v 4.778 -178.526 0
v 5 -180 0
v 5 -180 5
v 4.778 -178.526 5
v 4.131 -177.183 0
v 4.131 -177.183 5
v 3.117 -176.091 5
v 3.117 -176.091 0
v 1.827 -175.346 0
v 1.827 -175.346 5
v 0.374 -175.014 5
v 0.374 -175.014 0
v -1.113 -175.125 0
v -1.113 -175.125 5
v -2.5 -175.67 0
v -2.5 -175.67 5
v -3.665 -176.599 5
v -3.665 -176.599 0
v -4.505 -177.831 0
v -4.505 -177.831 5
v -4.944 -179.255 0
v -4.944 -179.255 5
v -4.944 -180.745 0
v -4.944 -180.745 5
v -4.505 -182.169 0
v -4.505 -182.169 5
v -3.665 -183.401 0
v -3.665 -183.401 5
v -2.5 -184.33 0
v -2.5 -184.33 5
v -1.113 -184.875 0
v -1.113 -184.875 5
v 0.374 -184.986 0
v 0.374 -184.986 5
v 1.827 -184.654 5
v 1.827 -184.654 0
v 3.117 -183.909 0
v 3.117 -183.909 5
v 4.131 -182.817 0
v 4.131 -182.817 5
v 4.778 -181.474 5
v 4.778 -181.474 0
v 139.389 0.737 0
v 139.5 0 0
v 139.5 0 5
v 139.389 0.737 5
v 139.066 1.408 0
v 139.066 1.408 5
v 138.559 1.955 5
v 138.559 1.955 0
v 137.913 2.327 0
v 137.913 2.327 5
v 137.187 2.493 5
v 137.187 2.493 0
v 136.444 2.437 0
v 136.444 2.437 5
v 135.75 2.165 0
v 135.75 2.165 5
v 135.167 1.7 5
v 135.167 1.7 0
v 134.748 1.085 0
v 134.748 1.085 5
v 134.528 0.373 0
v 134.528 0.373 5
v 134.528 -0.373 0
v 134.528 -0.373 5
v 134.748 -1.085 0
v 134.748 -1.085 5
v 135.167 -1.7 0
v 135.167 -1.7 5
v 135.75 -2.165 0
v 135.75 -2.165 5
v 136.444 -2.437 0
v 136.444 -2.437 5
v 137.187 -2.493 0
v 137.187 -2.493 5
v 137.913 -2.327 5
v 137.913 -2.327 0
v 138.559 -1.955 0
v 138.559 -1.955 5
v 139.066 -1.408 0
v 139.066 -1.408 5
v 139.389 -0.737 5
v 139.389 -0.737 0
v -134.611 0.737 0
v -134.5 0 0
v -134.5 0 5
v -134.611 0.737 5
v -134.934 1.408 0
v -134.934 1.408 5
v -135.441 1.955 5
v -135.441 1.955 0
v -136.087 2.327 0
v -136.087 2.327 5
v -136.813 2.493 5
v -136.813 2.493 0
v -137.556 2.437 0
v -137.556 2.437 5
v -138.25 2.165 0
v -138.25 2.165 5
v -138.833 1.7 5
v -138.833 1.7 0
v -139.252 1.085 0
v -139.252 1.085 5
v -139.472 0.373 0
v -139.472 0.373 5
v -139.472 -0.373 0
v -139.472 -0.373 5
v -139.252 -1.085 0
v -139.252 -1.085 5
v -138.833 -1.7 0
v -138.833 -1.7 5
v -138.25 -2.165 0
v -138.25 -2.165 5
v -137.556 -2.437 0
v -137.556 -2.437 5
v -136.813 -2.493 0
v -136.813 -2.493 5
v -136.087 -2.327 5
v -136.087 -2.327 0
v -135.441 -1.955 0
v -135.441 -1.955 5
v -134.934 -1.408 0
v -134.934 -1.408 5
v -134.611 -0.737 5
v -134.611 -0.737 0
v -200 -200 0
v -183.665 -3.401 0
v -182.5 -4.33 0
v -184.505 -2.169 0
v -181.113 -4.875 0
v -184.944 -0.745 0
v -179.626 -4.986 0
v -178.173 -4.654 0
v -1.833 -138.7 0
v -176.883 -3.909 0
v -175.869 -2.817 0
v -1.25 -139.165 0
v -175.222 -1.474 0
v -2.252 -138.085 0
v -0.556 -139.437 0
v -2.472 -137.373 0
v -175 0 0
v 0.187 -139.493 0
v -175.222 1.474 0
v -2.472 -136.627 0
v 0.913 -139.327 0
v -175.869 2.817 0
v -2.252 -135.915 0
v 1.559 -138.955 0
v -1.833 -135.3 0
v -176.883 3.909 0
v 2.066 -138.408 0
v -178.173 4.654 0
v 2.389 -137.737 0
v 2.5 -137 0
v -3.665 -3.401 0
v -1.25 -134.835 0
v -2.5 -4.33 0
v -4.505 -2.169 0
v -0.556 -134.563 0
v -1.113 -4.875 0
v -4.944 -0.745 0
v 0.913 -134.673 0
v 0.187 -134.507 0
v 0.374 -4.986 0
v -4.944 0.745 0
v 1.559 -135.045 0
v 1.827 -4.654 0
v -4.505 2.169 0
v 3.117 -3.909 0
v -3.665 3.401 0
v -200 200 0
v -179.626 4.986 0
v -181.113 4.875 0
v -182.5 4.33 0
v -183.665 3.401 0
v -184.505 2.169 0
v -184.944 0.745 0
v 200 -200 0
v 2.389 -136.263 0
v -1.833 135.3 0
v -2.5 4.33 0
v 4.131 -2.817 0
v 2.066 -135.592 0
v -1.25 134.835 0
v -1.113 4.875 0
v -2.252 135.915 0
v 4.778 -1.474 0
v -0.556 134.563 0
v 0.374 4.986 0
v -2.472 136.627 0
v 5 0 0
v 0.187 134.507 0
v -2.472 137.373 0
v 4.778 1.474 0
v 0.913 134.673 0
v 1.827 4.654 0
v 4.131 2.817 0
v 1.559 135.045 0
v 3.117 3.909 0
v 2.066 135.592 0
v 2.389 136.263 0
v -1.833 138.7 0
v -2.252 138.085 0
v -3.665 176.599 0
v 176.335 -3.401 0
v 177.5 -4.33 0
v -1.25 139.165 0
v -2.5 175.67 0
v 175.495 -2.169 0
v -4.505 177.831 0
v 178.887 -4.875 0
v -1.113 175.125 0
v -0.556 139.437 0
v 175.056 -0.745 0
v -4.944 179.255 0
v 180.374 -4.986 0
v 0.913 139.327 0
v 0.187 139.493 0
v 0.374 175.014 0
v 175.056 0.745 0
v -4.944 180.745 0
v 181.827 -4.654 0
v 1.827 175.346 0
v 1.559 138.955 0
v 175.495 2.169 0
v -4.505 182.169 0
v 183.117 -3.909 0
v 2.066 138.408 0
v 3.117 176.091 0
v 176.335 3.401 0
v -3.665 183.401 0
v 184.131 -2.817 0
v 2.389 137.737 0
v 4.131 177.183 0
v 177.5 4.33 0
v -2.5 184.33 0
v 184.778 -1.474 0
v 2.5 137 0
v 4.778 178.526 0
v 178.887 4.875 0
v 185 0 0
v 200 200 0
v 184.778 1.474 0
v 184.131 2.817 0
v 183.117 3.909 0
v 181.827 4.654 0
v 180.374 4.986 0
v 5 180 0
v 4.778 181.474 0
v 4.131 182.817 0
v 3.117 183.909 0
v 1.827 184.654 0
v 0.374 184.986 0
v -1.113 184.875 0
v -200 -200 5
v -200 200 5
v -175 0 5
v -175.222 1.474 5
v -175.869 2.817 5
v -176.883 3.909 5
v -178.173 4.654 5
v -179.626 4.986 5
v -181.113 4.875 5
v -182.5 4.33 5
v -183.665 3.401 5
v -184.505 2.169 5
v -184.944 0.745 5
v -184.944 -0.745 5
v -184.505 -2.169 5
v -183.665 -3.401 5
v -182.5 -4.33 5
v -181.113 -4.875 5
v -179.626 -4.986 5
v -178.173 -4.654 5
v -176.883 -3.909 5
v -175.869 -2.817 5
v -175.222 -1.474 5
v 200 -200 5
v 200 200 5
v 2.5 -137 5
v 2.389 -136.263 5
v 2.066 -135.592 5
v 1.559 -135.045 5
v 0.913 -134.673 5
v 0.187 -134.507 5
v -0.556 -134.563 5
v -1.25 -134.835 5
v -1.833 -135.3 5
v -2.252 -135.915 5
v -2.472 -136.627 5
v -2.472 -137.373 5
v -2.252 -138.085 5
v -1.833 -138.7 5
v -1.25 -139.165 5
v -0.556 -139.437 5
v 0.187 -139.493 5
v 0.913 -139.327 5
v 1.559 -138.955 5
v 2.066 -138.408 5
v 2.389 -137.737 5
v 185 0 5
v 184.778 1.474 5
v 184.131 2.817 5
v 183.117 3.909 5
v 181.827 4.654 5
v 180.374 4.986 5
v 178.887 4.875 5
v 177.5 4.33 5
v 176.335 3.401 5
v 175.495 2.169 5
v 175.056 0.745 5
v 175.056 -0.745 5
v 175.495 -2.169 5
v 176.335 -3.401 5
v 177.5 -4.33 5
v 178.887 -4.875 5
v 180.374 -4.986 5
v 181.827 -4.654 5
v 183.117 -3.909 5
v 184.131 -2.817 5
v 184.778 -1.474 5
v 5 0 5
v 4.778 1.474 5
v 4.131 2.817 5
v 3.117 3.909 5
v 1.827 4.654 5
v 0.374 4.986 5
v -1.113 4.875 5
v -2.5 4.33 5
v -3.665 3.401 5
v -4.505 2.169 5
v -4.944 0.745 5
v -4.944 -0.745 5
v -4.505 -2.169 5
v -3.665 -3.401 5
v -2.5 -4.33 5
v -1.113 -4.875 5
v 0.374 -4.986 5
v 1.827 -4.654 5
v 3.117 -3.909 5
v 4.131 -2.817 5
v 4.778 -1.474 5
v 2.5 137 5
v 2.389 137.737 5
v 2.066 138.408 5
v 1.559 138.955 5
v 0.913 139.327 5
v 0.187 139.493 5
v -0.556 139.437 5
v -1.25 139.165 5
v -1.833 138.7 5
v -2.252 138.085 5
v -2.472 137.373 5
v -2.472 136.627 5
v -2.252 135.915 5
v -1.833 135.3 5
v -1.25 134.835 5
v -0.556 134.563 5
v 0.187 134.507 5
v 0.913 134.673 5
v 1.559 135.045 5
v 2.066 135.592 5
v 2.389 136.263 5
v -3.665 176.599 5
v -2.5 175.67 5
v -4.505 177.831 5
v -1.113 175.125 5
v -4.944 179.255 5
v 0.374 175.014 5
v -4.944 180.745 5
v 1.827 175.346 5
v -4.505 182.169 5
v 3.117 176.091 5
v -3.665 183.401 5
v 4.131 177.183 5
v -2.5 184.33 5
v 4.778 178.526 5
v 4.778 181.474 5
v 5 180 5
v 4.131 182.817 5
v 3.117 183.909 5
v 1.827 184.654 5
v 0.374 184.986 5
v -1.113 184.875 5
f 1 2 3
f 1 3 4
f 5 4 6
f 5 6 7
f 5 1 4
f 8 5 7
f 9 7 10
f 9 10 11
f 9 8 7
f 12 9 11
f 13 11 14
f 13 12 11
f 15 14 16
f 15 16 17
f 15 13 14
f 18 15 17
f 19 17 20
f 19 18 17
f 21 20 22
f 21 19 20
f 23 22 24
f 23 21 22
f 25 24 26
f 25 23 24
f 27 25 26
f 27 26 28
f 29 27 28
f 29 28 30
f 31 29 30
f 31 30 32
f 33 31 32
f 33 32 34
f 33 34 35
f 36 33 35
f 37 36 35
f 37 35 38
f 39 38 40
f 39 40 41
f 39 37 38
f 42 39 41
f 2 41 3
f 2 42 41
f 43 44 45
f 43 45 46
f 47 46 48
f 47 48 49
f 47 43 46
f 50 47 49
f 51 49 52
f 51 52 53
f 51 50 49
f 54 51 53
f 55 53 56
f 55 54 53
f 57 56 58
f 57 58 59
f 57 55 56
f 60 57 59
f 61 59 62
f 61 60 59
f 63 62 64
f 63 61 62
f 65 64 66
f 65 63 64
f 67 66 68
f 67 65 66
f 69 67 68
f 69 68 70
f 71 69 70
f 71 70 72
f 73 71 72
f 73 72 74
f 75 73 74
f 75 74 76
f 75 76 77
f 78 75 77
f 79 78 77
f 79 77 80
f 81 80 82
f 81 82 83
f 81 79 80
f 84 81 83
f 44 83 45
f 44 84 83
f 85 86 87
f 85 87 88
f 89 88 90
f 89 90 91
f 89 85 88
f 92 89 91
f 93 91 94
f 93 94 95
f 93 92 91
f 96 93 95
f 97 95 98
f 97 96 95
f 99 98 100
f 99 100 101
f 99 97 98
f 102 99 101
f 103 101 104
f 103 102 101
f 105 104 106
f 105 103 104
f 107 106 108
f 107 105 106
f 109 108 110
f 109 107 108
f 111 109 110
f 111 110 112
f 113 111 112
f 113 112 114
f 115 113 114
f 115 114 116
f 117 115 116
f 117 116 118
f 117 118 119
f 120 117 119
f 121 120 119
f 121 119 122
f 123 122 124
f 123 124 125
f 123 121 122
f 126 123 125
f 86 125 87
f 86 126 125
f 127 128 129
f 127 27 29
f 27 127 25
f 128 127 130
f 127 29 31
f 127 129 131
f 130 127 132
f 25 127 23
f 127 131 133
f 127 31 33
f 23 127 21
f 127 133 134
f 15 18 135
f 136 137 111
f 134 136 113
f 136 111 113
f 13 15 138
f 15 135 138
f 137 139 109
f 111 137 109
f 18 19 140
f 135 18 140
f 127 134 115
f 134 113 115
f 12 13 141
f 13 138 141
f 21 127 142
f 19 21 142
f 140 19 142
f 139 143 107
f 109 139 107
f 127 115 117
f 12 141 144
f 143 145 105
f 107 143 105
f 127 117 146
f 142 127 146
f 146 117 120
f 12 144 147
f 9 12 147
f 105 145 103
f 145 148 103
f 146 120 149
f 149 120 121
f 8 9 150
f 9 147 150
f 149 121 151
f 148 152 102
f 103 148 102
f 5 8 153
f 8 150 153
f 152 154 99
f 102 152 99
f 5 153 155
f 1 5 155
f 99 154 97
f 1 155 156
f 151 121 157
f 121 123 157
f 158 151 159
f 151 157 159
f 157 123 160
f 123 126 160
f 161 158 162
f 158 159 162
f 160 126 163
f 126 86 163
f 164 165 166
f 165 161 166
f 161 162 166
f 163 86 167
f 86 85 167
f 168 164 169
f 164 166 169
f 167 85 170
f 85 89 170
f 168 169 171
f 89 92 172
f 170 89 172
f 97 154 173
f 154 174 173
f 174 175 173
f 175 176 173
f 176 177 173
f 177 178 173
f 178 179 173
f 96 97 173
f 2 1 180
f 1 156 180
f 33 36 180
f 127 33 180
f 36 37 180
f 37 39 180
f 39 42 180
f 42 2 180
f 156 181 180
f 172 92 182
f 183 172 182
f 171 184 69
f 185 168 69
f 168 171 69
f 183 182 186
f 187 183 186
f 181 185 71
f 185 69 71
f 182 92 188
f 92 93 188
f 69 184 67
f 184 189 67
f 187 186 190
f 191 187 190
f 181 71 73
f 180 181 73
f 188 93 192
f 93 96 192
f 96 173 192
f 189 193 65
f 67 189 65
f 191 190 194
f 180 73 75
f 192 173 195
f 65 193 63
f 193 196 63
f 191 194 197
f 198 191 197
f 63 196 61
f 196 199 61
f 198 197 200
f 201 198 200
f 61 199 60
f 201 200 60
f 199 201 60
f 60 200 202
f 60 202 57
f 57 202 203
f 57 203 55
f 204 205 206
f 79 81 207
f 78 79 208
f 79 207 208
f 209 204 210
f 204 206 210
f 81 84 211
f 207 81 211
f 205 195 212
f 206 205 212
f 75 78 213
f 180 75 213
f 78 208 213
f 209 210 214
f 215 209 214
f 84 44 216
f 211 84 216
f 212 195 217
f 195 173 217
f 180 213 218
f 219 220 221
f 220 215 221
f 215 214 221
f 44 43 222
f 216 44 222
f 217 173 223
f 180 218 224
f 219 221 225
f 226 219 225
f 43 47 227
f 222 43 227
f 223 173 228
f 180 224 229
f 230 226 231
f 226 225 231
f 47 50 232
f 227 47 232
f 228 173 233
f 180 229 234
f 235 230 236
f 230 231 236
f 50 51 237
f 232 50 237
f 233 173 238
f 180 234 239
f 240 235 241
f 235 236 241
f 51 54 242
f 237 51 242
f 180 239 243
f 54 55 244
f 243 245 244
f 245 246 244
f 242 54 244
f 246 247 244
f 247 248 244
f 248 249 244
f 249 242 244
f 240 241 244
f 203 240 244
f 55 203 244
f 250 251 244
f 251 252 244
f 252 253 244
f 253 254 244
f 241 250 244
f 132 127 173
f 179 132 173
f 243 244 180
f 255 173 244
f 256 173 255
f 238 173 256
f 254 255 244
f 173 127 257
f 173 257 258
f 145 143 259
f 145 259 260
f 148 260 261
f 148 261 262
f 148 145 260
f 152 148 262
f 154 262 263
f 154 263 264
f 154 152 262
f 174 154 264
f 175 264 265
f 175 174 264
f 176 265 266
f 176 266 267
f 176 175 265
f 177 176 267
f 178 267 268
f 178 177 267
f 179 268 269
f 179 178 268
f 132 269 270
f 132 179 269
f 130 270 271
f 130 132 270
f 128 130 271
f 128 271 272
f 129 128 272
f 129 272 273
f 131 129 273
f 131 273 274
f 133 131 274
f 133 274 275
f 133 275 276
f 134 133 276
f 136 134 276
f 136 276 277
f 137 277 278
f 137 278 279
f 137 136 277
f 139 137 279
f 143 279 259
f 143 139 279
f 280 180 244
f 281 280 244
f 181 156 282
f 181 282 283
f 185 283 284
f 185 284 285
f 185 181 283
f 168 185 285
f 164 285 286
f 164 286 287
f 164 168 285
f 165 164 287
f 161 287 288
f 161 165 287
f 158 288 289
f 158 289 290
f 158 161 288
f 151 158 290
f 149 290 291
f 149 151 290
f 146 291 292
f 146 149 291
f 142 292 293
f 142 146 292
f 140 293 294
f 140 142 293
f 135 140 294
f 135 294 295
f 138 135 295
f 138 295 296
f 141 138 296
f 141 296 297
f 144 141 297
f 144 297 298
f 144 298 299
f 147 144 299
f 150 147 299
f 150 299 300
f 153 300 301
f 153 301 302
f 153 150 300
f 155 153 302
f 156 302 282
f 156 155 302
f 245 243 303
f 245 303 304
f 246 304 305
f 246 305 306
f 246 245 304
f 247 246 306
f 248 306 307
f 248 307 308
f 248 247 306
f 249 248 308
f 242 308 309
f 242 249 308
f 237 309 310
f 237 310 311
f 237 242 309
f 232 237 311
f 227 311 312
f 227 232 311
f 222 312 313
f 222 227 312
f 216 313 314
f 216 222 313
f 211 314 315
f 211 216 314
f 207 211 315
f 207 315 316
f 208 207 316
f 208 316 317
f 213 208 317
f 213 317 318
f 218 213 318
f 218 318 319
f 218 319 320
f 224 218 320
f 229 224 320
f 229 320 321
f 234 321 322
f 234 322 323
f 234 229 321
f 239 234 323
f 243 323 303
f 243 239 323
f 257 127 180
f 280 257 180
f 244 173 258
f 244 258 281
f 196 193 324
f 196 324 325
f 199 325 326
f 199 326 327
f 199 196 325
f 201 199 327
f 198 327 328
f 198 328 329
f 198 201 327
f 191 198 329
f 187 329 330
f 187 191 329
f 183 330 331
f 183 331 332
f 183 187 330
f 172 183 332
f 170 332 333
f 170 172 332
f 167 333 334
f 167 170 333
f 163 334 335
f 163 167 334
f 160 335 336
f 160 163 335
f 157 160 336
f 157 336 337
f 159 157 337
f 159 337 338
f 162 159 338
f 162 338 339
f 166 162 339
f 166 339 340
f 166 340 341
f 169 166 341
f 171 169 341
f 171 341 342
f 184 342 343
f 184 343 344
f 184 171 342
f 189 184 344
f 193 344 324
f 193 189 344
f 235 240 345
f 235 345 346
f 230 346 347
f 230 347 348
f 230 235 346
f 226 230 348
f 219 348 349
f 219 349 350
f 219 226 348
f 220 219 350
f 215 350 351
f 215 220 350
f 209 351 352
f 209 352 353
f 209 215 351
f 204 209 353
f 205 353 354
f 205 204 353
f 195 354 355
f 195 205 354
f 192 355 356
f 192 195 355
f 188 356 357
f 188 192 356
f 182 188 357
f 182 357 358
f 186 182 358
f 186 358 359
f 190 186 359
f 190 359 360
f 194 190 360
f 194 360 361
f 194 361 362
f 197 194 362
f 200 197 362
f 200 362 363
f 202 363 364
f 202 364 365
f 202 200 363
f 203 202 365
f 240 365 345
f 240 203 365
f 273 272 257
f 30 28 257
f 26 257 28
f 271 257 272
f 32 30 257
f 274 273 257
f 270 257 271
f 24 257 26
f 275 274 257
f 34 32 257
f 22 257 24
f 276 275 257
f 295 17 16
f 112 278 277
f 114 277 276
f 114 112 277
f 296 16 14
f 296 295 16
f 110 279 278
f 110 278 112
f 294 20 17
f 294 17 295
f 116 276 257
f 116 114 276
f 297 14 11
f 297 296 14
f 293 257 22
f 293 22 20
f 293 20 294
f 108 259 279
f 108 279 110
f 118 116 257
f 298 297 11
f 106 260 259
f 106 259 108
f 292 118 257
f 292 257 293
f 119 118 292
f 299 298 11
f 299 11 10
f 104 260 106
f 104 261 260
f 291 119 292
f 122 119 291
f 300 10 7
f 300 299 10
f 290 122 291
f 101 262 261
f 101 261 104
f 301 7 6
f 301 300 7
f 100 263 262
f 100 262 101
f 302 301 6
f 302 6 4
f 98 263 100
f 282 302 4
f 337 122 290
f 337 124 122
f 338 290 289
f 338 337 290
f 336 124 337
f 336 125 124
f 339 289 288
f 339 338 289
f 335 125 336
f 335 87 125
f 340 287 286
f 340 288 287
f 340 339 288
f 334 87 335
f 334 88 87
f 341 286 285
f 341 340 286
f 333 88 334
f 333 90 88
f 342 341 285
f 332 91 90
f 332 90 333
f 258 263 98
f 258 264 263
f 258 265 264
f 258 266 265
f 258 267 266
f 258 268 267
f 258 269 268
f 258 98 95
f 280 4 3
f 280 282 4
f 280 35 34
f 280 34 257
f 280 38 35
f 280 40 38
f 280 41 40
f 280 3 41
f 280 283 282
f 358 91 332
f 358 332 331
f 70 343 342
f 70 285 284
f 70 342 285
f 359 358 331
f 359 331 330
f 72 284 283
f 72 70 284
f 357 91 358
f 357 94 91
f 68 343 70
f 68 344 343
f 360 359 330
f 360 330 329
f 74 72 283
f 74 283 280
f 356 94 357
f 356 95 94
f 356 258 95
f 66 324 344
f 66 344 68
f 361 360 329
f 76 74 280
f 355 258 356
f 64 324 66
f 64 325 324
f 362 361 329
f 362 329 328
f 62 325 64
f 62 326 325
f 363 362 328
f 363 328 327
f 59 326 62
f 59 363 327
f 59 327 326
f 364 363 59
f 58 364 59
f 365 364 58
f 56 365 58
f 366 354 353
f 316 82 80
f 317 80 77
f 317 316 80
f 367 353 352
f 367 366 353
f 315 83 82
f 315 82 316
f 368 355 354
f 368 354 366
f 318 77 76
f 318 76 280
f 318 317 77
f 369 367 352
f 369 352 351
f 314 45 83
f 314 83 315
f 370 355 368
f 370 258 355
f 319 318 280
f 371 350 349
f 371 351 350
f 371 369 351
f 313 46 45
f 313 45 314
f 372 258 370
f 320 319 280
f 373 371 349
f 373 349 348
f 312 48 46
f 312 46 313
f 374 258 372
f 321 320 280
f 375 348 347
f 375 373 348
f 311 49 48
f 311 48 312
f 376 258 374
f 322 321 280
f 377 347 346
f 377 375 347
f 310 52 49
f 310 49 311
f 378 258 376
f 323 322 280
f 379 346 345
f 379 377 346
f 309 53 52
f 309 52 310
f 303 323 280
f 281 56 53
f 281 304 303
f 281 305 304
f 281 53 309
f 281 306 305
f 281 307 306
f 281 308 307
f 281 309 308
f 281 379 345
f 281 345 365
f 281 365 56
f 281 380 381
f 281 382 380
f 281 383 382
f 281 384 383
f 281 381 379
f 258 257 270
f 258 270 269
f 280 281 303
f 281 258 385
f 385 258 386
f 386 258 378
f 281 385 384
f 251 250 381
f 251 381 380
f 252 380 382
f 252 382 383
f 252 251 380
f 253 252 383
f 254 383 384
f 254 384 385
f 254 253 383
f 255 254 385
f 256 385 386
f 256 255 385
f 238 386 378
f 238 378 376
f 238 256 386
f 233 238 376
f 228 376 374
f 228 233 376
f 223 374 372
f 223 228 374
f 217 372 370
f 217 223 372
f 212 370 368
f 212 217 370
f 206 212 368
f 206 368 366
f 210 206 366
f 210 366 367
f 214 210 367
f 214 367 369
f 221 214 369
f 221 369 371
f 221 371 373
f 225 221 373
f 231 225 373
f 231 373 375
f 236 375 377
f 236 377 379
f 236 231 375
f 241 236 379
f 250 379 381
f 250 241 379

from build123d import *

# Parameters (mm, degrees)
F0_W     = 400
F0_H     = 400
F0_R     = 5
F0_R_2   = 2.5
F1_DEPTH = 5


with BuildPart() as f1:
    # F0 (on Top) → F1 (new body)
    with BuildSketch(Plane.XY):
        Rectangle(F0_W, F0_H)
        with Locations((0, -180)):
            Circle(F0_R, mode=Mode.SUBTRACT)
        with Locations((0, -137)):
            Circle(F0_R_2, mode=Mode.SUBTRACT)
        with Locations((-180, 0)):
            Circle(F0_R, mode=Mode.SUBTRACT)
        with Locations((-137, 0)):
            Circle(F0_R_2, mode=Mode.SUBTRACT)
        Circle(F0_R, mode=Mode.SUBTRACT)
        with Locations((137, 0)):
            Circle(F0_R_2, mode=Mode.SUBTRACT)
        with Locations((180, 0)):
            Circle(F0_R, mode=Mode.SUBTRACT)
        with Locations((0, 137)):
            Circle(F0_R_2, mode=Mode.SUBTRACT)
        with Locations((0, 180)):
            Circle(F0_R, mode=Mode.SUBTRACT)
    extrude(amount=F1_DEPTH)


solid = f1.part
